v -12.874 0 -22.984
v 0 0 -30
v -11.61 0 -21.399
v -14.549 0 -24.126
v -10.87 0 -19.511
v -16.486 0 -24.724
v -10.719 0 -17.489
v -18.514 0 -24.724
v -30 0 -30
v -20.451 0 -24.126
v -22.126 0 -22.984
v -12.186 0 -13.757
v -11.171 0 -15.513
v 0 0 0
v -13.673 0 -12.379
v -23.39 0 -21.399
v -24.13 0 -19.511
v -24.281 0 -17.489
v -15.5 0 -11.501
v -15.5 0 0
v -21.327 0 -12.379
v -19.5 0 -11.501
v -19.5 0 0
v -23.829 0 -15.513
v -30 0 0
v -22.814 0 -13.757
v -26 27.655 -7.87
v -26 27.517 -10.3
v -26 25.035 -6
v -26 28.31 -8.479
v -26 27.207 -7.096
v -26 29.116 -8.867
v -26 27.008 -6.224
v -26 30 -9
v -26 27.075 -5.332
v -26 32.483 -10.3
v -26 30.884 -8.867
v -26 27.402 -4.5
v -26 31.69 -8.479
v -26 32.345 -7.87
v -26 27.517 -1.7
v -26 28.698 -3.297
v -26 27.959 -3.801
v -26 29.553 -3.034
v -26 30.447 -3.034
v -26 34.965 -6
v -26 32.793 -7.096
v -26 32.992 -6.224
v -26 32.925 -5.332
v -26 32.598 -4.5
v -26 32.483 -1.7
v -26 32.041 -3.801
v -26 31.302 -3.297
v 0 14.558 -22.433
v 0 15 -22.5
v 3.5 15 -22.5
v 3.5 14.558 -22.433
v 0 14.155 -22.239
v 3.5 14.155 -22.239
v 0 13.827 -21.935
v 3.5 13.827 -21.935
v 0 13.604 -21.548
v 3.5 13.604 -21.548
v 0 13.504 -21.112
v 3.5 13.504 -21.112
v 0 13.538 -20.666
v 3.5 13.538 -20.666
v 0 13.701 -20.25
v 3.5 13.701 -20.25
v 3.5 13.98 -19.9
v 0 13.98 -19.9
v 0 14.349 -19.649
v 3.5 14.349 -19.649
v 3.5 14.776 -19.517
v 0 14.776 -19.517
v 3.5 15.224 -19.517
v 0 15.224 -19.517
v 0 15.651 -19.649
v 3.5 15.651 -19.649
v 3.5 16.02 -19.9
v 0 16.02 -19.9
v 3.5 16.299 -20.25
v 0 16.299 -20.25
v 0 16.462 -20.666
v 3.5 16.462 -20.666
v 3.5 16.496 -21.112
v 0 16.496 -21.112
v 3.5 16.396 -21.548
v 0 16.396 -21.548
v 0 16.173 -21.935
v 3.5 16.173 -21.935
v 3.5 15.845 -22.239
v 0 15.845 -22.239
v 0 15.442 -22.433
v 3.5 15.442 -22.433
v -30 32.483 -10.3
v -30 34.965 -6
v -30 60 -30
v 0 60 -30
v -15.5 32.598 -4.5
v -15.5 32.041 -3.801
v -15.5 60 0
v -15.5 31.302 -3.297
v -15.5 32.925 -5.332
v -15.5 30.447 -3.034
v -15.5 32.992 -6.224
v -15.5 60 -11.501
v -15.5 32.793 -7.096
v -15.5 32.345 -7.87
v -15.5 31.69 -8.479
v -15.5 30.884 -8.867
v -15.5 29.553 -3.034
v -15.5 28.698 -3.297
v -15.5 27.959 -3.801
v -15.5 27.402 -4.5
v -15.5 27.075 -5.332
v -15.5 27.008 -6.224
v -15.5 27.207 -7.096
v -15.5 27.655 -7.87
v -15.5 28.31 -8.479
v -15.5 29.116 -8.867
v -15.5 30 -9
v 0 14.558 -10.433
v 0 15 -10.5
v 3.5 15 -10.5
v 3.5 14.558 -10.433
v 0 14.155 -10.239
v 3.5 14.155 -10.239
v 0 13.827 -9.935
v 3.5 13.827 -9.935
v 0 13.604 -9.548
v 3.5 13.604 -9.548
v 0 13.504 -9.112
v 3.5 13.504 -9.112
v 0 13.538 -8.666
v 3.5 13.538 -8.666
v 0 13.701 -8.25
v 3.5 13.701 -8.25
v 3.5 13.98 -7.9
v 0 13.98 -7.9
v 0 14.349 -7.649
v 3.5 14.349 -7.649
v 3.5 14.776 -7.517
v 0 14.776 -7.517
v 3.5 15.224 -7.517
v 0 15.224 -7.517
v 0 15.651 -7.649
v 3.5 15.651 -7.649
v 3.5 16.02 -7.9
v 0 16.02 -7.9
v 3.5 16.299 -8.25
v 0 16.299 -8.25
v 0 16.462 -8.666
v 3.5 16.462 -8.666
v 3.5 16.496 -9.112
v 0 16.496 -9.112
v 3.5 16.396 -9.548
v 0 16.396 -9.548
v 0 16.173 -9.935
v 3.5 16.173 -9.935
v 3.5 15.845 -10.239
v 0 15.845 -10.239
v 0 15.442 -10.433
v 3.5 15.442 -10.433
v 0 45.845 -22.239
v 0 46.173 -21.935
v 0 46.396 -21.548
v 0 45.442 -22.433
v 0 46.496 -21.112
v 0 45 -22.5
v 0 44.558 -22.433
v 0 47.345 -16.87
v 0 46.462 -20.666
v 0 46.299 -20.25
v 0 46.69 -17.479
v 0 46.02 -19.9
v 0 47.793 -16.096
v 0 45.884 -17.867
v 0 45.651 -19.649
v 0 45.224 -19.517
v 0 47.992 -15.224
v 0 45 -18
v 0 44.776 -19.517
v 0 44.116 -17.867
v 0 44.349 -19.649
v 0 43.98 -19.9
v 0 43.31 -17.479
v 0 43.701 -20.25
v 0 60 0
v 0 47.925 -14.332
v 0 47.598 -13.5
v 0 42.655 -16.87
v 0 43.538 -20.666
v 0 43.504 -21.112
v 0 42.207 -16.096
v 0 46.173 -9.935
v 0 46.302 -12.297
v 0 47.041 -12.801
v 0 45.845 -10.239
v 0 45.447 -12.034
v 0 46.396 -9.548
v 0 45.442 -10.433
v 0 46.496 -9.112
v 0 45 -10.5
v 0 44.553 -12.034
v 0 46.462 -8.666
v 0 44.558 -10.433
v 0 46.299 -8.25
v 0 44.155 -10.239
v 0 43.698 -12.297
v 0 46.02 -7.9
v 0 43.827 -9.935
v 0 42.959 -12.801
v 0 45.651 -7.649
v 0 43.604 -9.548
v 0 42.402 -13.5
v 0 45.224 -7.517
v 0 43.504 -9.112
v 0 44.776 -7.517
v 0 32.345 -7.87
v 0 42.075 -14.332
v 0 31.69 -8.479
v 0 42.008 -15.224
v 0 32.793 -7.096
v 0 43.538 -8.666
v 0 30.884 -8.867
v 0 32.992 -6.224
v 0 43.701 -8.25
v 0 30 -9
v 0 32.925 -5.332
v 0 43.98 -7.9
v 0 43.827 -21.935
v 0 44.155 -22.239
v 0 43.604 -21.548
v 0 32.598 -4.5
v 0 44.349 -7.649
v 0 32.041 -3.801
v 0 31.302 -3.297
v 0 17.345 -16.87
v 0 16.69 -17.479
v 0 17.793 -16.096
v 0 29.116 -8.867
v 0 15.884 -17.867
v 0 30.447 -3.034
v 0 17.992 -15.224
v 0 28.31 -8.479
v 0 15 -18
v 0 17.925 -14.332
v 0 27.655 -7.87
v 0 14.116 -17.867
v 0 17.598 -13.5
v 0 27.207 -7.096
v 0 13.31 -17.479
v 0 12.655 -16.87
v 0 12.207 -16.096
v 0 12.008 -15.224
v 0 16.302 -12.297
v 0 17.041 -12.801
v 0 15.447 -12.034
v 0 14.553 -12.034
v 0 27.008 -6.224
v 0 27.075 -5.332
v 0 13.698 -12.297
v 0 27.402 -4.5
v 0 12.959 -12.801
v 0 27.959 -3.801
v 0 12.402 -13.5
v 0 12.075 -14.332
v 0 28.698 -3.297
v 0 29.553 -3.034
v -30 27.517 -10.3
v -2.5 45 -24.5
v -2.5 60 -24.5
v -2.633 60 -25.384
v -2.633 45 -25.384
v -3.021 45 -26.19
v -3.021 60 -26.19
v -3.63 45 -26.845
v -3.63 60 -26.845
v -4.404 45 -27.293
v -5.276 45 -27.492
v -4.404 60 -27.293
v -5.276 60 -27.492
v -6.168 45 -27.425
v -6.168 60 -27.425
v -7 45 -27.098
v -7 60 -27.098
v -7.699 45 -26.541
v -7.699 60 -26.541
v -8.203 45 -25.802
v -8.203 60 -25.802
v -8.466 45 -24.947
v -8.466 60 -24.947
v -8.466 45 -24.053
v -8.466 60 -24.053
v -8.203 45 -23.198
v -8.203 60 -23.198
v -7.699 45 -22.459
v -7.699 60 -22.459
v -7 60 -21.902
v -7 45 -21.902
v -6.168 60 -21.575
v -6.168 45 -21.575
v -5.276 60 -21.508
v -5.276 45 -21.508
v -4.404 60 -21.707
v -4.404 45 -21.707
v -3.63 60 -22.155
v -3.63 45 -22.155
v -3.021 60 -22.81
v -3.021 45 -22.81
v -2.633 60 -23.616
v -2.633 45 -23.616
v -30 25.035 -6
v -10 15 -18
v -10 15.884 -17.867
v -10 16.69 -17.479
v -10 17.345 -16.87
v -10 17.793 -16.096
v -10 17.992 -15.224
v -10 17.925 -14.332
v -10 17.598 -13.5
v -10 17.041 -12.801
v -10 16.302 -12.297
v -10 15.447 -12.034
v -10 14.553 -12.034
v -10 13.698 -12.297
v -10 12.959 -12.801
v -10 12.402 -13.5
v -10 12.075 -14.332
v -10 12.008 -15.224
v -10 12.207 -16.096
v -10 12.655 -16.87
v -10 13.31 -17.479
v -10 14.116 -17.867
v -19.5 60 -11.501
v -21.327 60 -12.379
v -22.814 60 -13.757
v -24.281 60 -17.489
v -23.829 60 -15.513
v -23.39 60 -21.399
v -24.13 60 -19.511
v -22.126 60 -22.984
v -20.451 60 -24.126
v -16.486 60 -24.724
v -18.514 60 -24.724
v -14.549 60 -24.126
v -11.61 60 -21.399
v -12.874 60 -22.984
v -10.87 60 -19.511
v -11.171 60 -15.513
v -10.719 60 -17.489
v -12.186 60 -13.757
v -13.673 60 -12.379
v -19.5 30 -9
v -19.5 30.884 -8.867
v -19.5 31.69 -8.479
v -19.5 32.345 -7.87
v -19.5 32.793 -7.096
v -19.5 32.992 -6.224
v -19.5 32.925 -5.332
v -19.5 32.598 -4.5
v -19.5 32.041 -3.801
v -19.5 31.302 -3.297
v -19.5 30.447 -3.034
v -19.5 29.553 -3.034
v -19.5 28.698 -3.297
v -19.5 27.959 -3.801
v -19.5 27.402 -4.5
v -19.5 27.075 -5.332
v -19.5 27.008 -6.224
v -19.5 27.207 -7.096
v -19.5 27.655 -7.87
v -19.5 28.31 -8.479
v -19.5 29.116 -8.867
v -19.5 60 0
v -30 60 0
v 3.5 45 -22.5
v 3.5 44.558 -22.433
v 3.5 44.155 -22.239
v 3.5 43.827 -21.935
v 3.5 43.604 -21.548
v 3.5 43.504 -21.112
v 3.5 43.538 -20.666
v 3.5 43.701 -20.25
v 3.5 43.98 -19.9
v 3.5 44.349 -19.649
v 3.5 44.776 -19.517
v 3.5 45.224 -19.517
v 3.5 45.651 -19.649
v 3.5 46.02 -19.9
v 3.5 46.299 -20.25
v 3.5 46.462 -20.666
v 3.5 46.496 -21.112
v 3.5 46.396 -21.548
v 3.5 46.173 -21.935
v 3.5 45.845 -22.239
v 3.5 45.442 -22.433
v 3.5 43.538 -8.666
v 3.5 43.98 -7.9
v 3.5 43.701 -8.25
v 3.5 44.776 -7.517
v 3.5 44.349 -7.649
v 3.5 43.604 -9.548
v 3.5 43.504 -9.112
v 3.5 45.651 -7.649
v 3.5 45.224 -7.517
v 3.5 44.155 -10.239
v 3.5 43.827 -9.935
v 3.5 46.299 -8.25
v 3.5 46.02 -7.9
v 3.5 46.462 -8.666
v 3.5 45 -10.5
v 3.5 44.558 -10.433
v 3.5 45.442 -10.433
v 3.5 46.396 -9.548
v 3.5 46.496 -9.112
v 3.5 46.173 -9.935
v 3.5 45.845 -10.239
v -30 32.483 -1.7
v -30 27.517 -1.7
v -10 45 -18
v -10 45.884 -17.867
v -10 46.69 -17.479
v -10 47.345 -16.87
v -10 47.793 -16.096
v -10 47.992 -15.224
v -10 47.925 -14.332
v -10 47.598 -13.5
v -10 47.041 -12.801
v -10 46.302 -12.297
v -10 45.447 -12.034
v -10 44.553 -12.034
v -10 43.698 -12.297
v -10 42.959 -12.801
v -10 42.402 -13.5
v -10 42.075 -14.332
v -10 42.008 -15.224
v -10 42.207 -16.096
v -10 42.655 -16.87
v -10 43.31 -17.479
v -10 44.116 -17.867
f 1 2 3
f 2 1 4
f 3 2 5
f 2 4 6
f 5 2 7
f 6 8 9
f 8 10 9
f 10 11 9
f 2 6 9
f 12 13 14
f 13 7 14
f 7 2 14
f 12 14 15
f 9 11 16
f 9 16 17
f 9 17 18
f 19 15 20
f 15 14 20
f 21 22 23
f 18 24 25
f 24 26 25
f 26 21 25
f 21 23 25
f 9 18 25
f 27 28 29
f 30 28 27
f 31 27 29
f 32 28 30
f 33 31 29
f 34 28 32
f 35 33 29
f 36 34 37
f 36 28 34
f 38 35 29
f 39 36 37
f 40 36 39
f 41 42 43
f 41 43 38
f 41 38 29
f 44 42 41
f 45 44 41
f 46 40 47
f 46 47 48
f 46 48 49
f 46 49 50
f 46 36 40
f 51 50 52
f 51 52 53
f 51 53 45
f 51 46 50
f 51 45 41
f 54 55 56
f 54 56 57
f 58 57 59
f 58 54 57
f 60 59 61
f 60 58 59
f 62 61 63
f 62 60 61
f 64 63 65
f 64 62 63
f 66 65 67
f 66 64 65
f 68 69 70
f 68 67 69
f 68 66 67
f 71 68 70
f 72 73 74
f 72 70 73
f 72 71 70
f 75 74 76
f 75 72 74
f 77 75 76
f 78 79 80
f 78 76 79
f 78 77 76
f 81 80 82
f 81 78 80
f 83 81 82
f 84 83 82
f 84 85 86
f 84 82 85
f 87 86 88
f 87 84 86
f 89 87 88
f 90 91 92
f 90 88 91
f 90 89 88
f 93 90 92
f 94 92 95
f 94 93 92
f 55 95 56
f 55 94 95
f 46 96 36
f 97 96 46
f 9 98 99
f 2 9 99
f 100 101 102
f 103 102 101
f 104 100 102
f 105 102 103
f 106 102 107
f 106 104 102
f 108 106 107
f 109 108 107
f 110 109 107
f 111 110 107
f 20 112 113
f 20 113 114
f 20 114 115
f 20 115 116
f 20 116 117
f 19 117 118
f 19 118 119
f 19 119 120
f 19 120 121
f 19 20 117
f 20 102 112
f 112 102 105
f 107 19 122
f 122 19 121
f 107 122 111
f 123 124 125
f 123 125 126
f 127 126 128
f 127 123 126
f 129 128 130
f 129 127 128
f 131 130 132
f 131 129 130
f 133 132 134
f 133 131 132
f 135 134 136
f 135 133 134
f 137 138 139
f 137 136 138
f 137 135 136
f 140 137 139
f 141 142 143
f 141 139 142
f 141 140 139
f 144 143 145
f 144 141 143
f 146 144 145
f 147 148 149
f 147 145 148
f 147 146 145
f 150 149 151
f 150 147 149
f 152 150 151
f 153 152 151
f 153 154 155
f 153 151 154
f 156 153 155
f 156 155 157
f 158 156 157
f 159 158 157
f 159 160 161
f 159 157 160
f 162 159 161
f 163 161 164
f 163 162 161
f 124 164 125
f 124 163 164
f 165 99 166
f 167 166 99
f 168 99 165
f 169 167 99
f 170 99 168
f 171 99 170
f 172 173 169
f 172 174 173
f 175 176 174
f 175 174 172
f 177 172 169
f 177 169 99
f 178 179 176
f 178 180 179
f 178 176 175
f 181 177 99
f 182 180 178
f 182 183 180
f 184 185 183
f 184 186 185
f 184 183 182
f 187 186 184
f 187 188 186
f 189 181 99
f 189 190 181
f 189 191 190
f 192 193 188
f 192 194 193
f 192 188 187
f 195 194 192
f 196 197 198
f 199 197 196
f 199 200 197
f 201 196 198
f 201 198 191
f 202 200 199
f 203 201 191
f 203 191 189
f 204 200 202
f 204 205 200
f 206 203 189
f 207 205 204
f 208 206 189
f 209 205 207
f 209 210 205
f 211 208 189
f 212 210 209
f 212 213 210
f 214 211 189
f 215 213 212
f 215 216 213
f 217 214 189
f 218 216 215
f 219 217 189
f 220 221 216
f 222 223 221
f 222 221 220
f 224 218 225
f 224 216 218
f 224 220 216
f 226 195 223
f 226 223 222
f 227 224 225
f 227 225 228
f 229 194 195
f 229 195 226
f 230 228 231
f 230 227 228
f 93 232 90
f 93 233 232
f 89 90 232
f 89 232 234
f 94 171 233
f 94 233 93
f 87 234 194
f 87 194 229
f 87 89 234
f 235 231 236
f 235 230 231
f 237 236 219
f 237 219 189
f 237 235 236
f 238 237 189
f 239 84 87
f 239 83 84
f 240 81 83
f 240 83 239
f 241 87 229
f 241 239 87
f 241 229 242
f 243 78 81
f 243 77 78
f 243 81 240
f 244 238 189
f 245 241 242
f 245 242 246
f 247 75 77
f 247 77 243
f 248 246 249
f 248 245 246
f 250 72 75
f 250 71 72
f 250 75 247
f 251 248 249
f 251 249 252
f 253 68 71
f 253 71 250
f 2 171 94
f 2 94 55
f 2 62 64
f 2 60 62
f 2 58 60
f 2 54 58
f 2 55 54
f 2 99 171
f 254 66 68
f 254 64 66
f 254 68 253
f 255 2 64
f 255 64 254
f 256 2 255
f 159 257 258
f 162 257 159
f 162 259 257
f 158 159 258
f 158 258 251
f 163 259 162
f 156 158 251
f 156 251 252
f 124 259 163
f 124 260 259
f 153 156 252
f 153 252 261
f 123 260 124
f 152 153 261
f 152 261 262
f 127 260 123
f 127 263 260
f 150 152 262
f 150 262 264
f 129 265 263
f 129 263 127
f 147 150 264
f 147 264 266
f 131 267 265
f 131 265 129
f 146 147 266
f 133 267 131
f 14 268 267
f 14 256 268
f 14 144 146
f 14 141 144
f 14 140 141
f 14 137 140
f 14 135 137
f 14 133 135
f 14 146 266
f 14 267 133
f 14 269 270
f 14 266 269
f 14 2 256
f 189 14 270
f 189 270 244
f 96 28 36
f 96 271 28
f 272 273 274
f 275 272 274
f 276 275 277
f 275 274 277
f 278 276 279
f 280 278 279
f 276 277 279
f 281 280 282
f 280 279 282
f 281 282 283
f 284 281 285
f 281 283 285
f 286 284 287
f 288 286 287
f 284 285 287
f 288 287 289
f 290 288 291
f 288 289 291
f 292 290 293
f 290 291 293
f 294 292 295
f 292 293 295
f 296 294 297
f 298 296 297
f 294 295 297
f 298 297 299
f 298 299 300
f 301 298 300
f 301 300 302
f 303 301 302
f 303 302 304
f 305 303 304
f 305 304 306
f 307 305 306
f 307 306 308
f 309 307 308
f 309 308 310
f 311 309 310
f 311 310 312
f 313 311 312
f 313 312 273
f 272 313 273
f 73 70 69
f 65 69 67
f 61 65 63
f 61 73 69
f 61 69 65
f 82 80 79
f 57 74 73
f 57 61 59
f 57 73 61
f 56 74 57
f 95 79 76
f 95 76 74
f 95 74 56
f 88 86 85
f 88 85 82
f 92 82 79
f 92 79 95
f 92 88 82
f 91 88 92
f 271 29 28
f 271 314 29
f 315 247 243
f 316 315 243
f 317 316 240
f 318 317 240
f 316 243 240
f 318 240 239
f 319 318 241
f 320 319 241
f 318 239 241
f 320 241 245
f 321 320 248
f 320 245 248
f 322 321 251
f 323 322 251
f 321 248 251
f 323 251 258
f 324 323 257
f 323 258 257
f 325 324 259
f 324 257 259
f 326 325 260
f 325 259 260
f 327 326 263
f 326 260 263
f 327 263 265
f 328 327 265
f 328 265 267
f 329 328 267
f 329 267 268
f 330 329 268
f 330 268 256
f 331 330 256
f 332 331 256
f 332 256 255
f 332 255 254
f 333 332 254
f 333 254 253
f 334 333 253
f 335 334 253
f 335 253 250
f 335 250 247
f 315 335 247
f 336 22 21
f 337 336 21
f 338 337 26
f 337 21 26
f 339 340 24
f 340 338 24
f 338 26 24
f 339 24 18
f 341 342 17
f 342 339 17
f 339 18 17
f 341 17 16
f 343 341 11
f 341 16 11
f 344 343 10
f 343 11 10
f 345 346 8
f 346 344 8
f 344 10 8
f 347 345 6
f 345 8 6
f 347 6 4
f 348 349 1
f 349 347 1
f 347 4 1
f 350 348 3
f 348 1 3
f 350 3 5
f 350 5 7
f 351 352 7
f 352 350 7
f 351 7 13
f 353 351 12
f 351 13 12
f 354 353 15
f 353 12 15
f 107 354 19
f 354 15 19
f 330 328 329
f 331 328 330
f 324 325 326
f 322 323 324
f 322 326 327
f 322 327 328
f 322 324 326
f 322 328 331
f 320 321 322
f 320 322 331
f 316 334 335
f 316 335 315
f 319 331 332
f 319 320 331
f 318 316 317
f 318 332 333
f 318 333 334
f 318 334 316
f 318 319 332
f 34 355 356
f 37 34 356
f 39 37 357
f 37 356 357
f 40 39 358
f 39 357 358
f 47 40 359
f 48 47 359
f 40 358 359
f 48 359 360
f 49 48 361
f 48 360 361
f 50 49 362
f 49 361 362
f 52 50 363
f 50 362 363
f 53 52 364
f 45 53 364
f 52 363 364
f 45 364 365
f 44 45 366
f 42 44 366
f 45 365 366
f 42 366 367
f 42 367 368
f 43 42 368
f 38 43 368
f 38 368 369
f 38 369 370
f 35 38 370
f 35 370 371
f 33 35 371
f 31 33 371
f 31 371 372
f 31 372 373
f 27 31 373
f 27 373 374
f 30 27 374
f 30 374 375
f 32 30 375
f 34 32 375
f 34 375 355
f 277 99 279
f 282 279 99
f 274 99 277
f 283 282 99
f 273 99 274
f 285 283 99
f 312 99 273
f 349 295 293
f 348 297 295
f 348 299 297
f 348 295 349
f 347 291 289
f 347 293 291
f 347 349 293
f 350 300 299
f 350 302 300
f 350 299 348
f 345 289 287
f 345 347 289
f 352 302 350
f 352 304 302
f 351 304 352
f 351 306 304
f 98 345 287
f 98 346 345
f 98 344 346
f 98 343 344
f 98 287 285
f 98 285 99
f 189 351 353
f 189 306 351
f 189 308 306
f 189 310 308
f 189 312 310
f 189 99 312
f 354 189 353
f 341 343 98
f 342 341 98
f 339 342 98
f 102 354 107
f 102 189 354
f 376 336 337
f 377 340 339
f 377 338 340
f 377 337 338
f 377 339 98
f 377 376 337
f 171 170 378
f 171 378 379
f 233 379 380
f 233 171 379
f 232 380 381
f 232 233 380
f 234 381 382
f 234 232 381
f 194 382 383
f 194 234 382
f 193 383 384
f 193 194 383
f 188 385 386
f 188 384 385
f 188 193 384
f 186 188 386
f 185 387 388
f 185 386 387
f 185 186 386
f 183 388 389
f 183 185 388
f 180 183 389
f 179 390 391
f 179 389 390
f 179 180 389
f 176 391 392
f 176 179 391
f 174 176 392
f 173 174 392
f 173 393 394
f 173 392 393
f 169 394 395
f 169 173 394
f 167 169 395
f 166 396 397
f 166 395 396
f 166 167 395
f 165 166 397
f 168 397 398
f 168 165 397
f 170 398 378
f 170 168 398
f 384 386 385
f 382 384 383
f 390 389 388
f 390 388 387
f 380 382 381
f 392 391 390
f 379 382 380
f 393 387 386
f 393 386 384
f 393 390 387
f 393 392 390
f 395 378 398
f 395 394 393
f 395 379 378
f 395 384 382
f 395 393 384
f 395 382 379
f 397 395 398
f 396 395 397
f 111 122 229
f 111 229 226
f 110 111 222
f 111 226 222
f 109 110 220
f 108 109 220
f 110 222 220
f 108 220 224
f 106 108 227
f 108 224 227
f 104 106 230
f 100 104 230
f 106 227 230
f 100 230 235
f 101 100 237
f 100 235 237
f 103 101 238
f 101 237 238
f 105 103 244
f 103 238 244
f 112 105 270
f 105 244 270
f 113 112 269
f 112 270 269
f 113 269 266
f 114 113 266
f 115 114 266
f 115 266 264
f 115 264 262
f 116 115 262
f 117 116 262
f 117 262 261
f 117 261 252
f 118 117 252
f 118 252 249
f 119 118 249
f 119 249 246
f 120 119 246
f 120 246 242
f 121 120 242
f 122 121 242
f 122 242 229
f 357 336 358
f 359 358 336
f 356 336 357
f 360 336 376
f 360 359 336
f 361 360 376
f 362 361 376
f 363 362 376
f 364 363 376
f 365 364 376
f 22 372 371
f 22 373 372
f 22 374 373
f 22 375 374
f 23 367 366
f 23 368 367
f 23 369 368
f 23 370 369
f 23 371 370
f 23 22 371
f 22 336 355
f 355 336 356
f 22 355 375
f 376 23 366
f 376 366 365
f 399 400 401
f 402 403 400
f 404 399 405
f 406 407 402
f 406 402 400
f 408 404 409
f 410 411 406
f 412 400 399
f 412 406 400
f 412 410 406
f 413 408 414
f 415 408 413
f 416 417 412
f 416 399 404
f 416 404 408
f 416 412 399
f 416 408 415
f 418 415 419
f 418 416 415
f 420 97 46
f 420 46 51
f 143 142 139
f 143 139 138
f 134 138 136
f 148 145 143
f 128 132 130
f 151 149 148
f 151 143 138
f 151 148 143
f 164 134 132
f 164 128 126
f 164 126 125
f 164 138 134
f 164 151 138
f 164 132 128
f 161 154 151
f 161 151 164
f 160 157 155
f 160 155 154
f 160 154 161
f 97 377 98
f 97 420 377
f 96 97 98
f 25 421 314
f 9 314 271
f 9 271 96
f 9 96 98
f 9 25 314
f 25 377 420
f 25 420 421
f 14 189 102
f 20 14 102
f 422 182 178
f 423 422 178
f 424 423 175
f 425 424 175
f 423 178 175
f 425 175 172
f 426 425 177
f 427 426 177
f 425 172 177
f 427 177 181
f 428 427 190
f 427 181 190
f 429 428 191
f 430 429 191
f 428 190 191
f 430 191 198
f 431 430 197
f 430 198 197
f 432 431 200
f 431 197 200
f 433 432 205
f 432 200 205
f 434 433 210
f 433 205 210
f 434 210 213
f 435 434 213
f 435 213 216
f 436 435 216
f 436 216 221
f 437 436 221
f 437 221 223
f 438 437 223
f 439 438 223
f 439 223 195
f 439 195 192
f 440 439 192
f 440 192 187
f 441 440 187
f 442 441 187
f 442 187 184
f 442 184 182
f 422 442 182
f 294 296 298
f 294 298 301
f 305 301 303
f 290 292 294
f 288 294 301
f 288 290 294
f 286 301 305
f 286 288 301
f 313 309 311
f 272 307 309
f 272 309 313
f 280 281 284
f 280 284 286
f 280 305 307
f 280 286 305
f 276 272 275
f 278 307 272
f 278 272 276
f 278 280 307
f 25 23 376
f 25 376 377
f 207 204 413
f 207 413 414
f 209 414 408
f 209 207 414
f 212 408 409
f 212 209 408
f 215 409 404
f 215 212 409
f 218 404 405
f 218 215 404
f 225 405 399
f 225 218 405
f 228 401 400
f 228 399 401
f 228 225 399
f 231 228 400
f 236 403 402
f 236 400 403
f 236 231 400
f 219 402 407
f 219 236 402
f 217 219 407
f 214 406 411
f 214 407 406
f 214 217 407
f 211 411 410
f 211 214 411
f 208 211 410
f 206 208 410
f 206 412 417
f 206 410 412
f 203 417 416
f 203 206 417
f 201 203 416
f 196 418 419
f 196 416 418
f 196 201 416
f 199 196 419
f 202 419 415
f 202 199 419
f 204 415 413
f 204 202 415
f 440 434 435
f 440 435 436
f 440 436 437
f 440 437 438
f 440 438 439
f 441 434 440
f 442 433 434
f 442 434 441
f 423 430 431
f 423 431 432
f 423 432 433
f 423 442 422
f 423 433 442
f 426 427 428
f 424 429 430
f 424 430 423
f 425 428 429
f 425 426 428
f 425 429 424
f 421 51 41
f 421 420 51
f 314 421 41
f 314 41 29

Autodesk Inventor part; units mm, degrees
ref_plane "YZ Plane" through (0, 0, 0) normal (1, 0, 0) x (0, 1, 0)
ref_plane "XZ Plane" through (0, 0, 0) normal (0, 1, 0) x (-1, 0, 0)
ref_plane "XY Plane" through (0, 0, 0) normal (0, 0, 1) x (1, 0, 0)
sketch "Sketch1" plane through (0, 0, 0) normal (0, 1, 0) x (-1, 0, 0)
  line L0 (30, 0) -> (30, -30)
  line L1 (30, -30) -> (0, -30)
  line L2 (0, -30) -> (0, 0)
  arc A0 (15.5, -11.5008) -> (19.5, -11.5008) centre (17.5, -18) ccw
  line L3 (17.5, -18) -> (17.5, -3) construction
  line L4 (15.5, 0) -> (15.5, -11.5008)
  line L5 (19.5, -11.5008) -> (19.5, 0)
  line L6 (0, 0) -> (15.5, 0)
  line L7 (19.5, 0) -> (30, 0)
  dimension "d0" = 30
  dimension "d1" = 30
  dimension "d2" = 13.6
  dimension "d3" = 18
  dimension "d8" = 17.5
  dimension "d9" = 4
  dimension "d10" = 2
extrude "Extrusion1" add sketch "Sketch1" along normal blind 60
sketch "Sketch2" plane through (0, 0, 0) normal (1, 0, 0) x (0, 0, -1)
  line L0 (0, 0) -> (30, 0) projected
  line L1 (30, 0) -> (30, 60) projected
  line L2 (0, 60) -> (30, 60) projected
  line L3 (0, 0) -> (0, 60) projected
  line L4 (11.5008, 0) -> (11.5008, 60) projected
  circle A0 centre (6, 30) radius 3
  dimension "d14" = 6
  dimension "d15" = 30
  dimension "d16" = 6
extrude "Extrusion2" cut sketch "Sketch2" against normal through all contours A0
sketch "Sketch3" plane through (-30, 0, -30) normal (-1, 0, 0) x (0, 0, 1)
  line L0 (30, 0) -> (30, 60) projected
  circle A0 centre (24, 30) radius 3 construction
  line L1 (19.7, 27.5174) -> (19.7, 32.4826)
  line L2 (19.7, 32.4826) -> (24, 34.9652)
  line L3 (24, 34.9652) -> (28.3, 32.4826)
  line L4 (28.3, 32.4826) -> (28.3, 27.5174)
  line L5 (28.3, 27.5174) -> (24, 25.0348)
  line L6 (24, 25.0348) -> (19.7, 27.5174)
  dimension "d31" = 4.3
sketch "Sketch4" plane through (0, 0, 0) normal (1, 0, 0) x (0, 0, -1)
  circle A0 centre (6, 30) radius 3 construction
  line L0 (0, 0) -> (30, 0) construction
  line L1 (30, 0) -> (30, 60) construction
  line L2 (0, 60) -> (30, 60) construction
  line L3 (0, 0) -> (0, 60) construction
  line L4 (30, 60) -> (0, 60) construction
  line L5 (15, 60) -> (15, 0) construction
  line L6 (30, 0) -> (0, 0) construction
  line L7 (0, 0) -> (0, 60) construction
  line L8 (0, 30) -> (30, 30) construction
  circle A1 centre (15, 45) radius 3
  circle A2 centre (15, 15) radius 3
  dimension "d22" = 6
  dimension "d23" = 15
  dimension "d24" = 6
  dimension "d25" = 15
extrude "Extrusion4" cut sketch "Sketch4" against normal blind 10
extrude "Extrusion6" cut sketch "Sketch3" against normal blind 4
sketch "Sketch6" plane through (0, 0, 0) normal (1, 0, 0) x (0, 0, -1)
  circle A0 centre (15, 45) radius 3 construction
  circle A1 centre (15, 15) radius 3 construction
  circle A2 centre (6, 30) radius 3 construction
  line L0 (0, 0) -> (30, 0) construction
  line L1 (30, 0) -> (30, 60) construction
  line L2 (0, 60) -> (30, 60) construction
  line L3 (0, 0) -> (0, 60) construction
  line L4 (30, 0) -> (30, 60) construction
  line L5 (30, 15) -> (0, 15) construction
  line L6 (30, 45) -> (0, 45) construction
  line L7 (0, 0) -> (0, 60) construction
  circle A3 centre (9, 15) radius 1.5
  circle A4 centre (21, 15) radius 1.5
  circle A5 centre (9, 45) radius 1.5
  circle A6 centre (21, 45) radius 1.5
  dimension "d34" = 3
  dimension "d35" = 3
  dimension "d36" = 3
  dimension "d37" = 3
  dimension "d38" = 6
  dimension "d39" = 6
  dimension "d40" = 6
  dimension "d41" = 6
  dimension "d42" = 15
  dimension "d43" = 15
extrude "Extrusion7" add sketch "Sketch6" along normal blind 3.5
sketch "Sketch7" plane through (0, 60, 0) normal (0, 1, 0) x (1, 0, 0)
  circle A0 centre (-5.5, 24.5) radius 3
  line L0 (0, 30) -> (-30, 30) projected
  line L1 (0, 0) -> (0, 30) projected
  dimension "d46" = 6
  dimension "d47" = 5.5
  dimension "d48" = 5.5
extrude "Extrusion8" cut sketch "Sketch7" against normal blind 15
properties part number "SupportV2_P1_ComFuros" material "PET Plastic"
